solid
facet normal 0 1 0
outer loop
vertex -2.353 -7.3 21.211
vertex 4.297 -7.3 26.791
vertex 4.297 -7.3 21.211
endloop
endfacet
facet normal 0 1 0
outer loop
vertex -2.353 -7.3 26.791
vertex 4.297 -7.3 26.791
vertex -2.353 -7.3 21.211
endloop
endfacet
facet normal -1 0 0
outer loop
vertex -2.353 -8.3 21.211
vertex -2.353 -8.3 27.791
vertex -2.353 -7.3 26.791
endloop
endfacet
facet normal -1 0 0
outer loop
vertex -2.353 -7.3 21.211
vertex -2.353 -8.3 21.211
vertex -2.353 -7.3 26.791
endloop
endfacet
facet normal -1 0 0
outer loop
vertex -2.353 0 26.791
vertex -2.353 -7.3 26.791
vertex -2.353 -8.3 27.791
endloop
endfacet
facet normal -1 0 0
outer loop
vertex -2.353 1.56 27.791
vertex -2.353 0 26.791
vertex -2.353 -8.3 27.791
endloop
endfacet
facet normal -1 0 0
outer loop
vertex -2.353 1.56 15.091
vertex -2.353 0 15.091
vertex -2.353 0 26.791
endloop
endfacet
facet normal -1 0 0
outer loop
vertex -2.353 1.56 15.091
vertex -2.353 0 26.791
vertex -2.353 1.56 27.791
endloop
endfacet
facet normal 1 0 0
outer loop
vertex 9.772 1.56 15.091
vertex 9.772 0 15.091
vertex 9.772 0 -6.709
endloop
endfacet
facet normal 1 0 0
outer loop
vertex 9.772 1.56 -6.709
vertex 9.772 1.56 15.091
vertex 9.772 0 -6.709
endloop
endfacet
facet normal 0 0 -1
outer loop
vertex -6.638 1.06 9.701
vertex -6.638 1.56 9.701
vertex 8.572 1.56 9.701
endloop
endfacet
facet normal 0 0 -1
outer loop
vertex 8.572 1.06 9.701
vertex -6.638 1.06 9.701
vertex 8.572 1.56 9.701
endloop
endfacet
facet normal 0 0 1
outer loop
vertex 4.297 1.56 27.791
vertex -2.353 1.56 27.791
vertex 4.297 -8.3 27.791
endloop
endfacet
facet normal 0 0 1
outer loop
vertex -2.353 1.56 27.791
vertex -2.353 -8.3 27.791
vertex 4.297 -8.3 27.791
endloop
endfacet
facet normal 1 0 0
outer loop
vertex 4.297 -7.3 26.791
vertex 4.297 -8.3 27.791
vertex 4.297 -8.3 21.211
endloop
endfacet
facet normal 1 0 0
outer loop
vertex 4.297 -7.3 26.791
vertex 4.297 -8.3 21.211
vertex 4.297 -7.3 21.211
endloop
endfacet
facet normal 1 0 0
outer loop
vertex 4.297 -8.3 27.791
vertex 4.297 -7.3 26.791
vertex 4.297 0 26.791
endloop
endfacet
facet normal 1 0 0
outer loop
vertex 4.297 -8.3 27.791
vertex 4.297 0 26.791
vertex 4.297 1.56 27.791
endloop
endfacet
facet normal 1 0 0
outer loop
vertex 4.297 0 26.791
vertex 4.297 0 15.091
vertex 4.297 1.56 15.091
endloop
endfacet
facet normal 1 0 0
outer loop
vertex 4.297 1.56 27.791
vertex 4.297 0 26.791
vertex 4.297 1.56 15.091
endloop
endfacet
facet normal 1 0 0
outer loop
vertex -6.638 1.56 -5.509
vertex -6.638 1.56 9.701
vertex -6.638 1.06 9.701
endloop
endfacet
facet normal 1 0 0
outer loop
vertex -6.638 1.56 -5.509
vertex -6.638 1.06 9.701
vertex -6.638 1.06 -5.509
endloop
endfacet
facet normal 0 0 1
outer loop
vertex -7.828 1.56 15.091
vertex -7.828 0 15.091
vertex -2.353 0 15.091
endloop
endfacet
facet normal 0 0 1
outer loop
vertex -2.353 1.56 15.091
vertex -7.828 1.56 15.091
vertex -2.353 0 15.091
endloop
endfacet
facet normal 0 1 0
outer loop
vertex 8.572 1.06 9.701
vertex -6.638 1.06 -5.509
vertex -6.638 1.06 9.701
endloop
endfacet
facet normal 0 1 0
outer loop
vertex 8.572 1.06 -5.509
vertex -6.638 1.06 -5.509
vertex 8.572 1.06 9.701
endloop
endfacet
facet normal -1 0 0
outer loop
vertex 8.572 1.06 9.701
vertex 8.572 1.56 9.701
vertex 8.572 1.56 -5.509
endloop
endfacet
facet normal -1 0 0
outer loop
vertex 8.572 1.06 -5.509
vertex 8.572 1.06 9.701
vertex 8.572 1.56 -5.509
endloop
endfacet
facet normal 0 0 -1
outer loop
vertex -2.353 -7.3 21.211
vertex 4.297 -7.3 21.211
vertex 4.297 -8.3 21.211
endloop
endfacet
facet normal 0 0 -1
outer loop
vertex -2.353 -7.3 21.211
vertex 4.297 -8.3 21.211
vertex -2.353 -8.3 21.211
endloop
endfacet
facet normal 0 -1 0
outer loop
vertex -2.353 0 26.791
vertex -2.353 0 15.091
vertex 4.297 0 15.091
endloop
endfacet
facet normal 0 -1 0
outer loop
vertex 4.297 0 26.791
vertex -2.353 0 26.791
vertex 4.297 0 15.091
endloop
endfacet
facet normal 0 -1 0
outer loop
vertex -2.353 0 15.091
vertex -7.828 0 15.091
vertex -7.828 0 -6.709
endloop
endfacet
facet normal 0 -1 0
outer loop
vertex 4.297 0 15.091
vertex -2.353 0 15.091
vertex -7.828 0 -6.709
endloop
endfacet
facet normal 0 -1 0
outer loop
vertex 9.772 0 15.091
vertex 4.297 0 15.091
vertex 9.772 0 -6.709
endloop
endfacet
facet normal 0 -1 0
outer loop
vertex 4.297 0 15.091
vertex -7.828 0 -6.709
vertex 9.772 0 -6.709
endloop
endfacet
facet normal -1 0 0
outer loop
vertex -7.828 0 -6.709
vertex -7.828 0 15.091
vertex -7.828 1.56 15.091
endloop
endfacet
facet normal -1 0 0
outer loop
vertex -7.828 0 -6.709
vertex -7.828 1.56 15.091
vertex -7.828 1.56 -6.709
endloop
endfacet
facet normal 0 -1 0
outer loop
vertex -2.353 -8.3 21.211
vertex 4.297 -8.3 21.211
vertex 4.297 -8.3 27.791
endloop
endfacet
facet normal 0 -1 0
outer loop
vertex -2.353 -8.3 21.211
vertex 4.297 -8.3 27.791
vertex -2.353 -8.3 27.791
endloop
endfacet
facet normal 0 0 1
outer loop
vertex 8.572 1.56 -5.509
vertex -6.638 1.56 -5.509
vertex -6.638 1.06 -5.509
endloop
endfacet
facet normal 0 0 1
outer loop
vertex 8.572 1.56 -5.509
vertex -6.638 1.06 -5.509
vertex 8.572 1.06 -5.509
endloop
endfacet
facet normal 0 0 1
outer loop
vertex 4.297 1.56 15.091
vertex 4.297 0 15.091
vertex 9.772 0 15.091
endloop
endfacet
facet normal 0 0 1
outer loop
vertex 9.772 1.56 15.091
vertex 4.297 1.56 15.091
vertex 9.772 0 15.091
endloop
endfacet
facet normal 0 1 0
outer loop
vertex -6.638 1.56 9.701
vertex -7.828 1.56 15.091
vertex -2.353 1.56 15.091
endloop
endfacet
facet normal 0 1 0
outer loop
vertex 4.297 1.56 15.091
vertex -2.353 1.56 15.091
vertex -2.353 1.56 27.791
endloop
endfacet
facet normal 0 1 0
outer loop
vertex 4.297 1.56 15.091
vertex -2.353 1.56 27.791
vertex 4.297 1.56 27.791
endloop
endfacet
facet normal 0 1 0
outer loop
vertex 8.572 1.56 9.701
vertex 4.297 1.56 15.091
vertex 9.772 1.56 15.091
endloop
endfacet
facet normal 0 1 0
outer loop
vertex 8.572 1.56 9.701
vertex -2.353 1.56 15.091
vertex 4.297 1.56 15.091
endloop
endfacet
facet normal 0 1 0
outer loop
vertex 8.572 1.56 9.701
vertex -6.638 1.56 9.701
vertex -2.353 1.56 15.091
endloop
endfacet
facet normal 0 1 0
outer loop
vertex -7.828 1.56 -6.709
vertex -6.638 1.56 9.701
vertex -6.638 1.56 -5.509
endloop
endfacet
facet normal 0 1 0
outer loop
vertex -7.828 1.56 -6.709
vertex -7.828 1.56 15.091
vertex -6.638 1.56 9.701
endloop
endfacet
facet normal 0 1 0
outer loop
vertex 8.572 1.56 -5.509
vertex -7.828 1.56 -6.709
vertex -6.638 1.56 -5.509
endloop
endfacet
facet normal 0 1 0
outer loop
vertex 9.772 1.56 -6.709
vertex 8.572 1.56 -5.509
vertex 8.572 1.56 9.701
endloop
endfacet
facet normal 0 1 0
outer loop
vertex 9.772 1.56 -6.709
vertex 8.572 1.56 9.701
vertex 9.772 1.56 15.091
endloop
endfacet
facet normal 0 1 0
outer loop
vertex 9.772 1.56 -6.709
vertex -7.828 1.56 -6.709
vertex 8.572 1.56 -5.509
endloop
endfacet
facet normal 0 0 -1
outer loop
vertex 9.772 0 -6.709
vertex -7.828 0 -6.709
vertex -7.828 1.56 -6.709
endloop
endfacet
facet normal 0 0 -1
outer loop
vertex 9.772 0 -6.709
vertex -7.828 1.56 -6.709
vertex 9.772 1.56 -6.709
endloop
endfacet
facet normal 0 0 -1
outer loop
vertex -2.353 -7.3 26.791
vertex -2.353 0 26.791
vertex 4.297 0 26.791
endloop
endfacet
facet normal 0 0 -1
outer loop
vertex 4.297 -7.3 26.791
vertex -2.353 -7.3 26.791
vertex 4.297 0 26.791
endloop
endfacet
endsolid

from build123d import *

# Parameters (mm, degrees)
SKETCH_1_W          = 17.6
SKETCH_1_H          = 21.8
EXTRUDE_1_DEPTH     = 1.56
SKETCH_2_W          = 15.21
SKETCH_2_H          = 15.21
CUT_EXTRUDE_1_DEPTH = 0.5
SKETCH_3_W          = 6.65
SKETCH_3_H          = 1.56
EXTRUDE_2_DEPTH     = 25.58
SKETCH_4_W          = 6.65
SKETCH_4_H          = 1
EXTRUDE_3_DEPTH     = 12.88
SKETCH_5_W          = 6.65
SKETCH_5_H          = 1
EXTRUDE_4_DEPTH     = 5.58
CUT_EXTRUDE_2_REACH = 45.766
SKETCH_6_W          = 6.65
SKETCH_6_H          = 12.88
CUT_EXTRUDE_3_REACH = 39.197
SKETCH_7_W          = 6.65
SKETCH_7_H          = 4.58


with BuildPart() as part:
    # 草图1 → 凸台-拉伸1 (new body)
    with BuildSketch(Plane(origin=(0, 0, 0), x_dir=(1, 0, 0), z_dir=(0, 1, 0))):
        with Locations((0.972375691, -4.190607735)):
            Rectangle(SKETCH_1_W, SKETCH_1_H)
    extrude(amount=EXTRUDE_1_DEPTH)

    # 草图2 → 切除-拉伸1 (cut)
    with BuildSketch(Plane(origin=(0, 1.56, 0), x_dir=(1, 0, 0), z_dir=(0, 1, 0))):
        with Locations((0.967375691, -2.095607735)):
            Rectangle(SKETCH_2_W, SKETCH_2_H)
    extrude(amount=-CUT_EXTRUDE_1_DEPTH, mode=Mode.SUBTRACT)

    # 草图3 → 凸台-拉伸2 (add)
    with BuildSketch(Plane.XY.offset(15.090607735)):
        with Locations((0.972375691, 0.78)):
            Rectangle(SKETCH_3_W, SKETCH_3_H)
    extrude(amount=EXTRUDE_2_DEPTH)

    # 草图4 → 凸台-拉伸3 (add)
    with BuildSketch(Plane(origin=(0, 0, 0), x_dir=(1, 0, 0), z_dir=(0, 1, 0))):
        with Locations((0.972375691, -27.290607735)):
            Rectangle(SKETCH_4_W, SKETCH_4_H)
    extrude(amount=-EXTRUDE_3_DEPTH)

    # 草图5 → 凸台-拉伸4 (add)
    with BuildSketch(Plane(origin=(0, 0, 26.790607735), x_dir=(-1, 0, 0), z_dir=(0, 0, -1))):
        with Locations((-0.972375691, -7.8)):
            Rectangle(SKETCH_5_W, SKETCH_5_H)
    extrude(amount=EXTRUDE_4_DEPTH)

    # 草图6 → 切除-拉伸2 (cut, up to next)
    with BuildSketch(Plane.XZ, mode=Mode.PRIVATE) as cut_extrude_2_sk1:
        with Locations((0.972375691, 34.230607735)):
            Rectangle(SKETCH_6_W, SKETCH_6_H)
    cut_extrude_2_tool1 = extrude(cut_extrude_2_sk1.sketch, amount=-CUT_EXTRUDE_2_REACH, mode=Mode.PRIVATE) & part.part
    add(cut_extrude_2_tool1.solids().sort_by_distance((0.972376, 0, 34.230608))[0], mode=Mode.SUBTRACT)

    # 草图7 → 切除-拉伸3 (cut, up to next)
    with BuildSketch(Plane(origin=(0, 0, 26.790607735), x_dir=(-1, 0, 0), z_dir=(0, 0, -1)), mode=Mode.PRIVATE) as cut_extrude_3_sk1:
        with Locations((-0.972375691, -10.59)):
            Rectangle(SKETCH_7_W, SKETCH_7_H)
    cut_extrude_3_tool1 = extrude(cut_extrude_3_sk1.sketch, amount=-CUT_EXTRUDE_3_REACH, mode=Mode.PRIVATE) & part.part
    add(cut_extrude_3_tool1.solids().sort_by_distance((0.972376, -10.59, 26.790608))[0], mode=Mode.SUBTRACT)


solid = part.part
